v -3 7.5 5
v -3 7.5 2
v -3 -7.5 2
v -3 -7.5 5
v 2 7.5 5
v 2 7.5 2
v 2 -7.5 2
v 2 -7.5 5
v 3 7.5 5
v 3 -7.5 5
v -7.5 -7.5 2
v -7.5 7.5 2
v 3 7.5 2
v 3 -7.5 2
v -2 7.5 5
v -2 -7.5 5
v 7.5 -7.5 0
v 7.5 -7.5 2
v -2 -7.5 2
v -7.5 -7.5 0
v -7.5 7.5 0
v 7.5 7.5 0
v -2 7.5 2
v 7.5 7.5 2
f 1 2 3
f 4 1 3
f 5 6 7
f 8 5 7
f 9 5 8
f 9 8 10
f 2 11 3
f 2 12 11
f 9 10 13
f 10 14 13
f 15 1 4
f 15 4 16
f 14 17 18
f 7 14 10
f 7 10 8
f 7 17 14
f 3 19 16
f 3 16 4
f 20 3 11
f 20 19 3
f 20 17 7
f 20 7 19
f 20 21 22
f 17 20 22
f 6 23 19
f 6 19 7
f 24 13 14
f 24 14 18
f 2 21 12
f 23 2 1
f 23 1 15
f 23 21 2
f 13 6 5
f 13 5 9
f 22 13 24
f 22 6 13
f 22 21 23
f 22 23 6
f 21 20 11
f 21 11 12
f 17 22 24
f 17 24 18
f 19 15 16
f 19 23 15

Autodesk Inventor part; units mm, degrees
ref_plane "YZ Plane" through (0, 0, 0) normal (1, 0, 0) x (0, 1, 0)
ref_plane "XZ Plane" through (0, 0, 0) normal (0, 1, 0) x (-1, 0, 0)
ref_plane "XY Plane" through (0, 0, 0) normal (0, 0, 1) x (1, 0, 0)
sketch "Sketch1" plane through (0, 0, 0) normal (0, 0, 1) x (1, 0, 0)
  line L0 (-7.5, 7.5) -> (7.5, 7.5)
  line L1 (7.5, 7.5) -> (7.5, -7.5)
  line L2 (7.5, -7.5) -> (-7.5, -7.5)
  line L3 (-7.5, -7.5) -> (-7.5, 7.5)
  line L4 (-7.5, 7.5) -> (7.5, -7.5) construction
  line L5 (7.5, 7.5) -> (-7.5, -7.5) construction
  point P0 (0, 0)
  dimension "d0" = 15
  dimension "d1" = 15
extrude "Extrusion1" add sketch "Sketch1" along normal blind 2
sketch "Sketch2" plane through (0, 0, 2) normal (0, 0, 1) x (1, 0, 0)
  line L0 (-7.5, -7.5) -> (7.5, -7.5) projected
  line L1 (1.5, 7.5) -> (1.5, -7.5) construction
  line L2 (-1.5, -7.5) -> (-1.5, 7.5) construction
  line L3 (1.5, 7.5) -> (2, 7.5) construction
  line L4 (2, 7.5) -> (2, -7.5)
  line L5 (2, -7.5) -> (1.5, -7.5)
  line L6 (1.5, -7.5) -> (1.5, 7.5)
  line L7 (7.5, -7.5) -> (-7.5, -7.5) projected
  line L8 (-1.5, 7.5) -> (-2, 7.5)
  line L9 (-2, 7.5) -> (-2, -7.5)
  line L10 (-2, -7.5) -> (-1.5, -7.5)
  line L11 (-1.5, -7.5) -> (-1.5, 7.5)
  line L12 (7.5, 7.5) -> (-7.5, 7.5) projected
  line L13 (2, -7.5) -> (3, -7.5)
  line L14 (3, -7.5) -> (3, 7.5)
  line L15 (3, 7.5) -> (2, 7.5)
  line L16 (-2, 7.5) -> (-3, 7.5)
  line L17 (-3, 7.5) -> (-3, -7.5)
  line L18 (-2, -7.5) -> (-3, -7.5)
  point P0 (0, 0)
  dimension "d4" = 0.5
  dimension "d5" = 0.5
  dimension "d8" = 1
  dimension "d9" = 1
extrude "Extrusion2" add sketch "Sketch2" along normal blind 3 contours L17 L12 L9 L0 | L4 L12 L14 L0
equation "\"d5\" = d4"
equation "\"d9\" = d8"
equation "\"BendRadius\" = Thickness"
equation "\"BendReliefWidth\" = Thickness"
equation "\"BendReliefDepth\" = 0.5 * Thickness"
equation "\"CornerReliefSize\" = 4 * Thickness"
equation "\"MinimumRemnant\" = 2 * Thickness"
equation "\"TransitionRadius\" = BendRadius"
equation "\"JacobiRadiusSize\" = Thickness"
equation "\"GapSize\" = Thickness"
equation "\"Thickness\" = 0.5"
properties part number "weight_holder_base"
